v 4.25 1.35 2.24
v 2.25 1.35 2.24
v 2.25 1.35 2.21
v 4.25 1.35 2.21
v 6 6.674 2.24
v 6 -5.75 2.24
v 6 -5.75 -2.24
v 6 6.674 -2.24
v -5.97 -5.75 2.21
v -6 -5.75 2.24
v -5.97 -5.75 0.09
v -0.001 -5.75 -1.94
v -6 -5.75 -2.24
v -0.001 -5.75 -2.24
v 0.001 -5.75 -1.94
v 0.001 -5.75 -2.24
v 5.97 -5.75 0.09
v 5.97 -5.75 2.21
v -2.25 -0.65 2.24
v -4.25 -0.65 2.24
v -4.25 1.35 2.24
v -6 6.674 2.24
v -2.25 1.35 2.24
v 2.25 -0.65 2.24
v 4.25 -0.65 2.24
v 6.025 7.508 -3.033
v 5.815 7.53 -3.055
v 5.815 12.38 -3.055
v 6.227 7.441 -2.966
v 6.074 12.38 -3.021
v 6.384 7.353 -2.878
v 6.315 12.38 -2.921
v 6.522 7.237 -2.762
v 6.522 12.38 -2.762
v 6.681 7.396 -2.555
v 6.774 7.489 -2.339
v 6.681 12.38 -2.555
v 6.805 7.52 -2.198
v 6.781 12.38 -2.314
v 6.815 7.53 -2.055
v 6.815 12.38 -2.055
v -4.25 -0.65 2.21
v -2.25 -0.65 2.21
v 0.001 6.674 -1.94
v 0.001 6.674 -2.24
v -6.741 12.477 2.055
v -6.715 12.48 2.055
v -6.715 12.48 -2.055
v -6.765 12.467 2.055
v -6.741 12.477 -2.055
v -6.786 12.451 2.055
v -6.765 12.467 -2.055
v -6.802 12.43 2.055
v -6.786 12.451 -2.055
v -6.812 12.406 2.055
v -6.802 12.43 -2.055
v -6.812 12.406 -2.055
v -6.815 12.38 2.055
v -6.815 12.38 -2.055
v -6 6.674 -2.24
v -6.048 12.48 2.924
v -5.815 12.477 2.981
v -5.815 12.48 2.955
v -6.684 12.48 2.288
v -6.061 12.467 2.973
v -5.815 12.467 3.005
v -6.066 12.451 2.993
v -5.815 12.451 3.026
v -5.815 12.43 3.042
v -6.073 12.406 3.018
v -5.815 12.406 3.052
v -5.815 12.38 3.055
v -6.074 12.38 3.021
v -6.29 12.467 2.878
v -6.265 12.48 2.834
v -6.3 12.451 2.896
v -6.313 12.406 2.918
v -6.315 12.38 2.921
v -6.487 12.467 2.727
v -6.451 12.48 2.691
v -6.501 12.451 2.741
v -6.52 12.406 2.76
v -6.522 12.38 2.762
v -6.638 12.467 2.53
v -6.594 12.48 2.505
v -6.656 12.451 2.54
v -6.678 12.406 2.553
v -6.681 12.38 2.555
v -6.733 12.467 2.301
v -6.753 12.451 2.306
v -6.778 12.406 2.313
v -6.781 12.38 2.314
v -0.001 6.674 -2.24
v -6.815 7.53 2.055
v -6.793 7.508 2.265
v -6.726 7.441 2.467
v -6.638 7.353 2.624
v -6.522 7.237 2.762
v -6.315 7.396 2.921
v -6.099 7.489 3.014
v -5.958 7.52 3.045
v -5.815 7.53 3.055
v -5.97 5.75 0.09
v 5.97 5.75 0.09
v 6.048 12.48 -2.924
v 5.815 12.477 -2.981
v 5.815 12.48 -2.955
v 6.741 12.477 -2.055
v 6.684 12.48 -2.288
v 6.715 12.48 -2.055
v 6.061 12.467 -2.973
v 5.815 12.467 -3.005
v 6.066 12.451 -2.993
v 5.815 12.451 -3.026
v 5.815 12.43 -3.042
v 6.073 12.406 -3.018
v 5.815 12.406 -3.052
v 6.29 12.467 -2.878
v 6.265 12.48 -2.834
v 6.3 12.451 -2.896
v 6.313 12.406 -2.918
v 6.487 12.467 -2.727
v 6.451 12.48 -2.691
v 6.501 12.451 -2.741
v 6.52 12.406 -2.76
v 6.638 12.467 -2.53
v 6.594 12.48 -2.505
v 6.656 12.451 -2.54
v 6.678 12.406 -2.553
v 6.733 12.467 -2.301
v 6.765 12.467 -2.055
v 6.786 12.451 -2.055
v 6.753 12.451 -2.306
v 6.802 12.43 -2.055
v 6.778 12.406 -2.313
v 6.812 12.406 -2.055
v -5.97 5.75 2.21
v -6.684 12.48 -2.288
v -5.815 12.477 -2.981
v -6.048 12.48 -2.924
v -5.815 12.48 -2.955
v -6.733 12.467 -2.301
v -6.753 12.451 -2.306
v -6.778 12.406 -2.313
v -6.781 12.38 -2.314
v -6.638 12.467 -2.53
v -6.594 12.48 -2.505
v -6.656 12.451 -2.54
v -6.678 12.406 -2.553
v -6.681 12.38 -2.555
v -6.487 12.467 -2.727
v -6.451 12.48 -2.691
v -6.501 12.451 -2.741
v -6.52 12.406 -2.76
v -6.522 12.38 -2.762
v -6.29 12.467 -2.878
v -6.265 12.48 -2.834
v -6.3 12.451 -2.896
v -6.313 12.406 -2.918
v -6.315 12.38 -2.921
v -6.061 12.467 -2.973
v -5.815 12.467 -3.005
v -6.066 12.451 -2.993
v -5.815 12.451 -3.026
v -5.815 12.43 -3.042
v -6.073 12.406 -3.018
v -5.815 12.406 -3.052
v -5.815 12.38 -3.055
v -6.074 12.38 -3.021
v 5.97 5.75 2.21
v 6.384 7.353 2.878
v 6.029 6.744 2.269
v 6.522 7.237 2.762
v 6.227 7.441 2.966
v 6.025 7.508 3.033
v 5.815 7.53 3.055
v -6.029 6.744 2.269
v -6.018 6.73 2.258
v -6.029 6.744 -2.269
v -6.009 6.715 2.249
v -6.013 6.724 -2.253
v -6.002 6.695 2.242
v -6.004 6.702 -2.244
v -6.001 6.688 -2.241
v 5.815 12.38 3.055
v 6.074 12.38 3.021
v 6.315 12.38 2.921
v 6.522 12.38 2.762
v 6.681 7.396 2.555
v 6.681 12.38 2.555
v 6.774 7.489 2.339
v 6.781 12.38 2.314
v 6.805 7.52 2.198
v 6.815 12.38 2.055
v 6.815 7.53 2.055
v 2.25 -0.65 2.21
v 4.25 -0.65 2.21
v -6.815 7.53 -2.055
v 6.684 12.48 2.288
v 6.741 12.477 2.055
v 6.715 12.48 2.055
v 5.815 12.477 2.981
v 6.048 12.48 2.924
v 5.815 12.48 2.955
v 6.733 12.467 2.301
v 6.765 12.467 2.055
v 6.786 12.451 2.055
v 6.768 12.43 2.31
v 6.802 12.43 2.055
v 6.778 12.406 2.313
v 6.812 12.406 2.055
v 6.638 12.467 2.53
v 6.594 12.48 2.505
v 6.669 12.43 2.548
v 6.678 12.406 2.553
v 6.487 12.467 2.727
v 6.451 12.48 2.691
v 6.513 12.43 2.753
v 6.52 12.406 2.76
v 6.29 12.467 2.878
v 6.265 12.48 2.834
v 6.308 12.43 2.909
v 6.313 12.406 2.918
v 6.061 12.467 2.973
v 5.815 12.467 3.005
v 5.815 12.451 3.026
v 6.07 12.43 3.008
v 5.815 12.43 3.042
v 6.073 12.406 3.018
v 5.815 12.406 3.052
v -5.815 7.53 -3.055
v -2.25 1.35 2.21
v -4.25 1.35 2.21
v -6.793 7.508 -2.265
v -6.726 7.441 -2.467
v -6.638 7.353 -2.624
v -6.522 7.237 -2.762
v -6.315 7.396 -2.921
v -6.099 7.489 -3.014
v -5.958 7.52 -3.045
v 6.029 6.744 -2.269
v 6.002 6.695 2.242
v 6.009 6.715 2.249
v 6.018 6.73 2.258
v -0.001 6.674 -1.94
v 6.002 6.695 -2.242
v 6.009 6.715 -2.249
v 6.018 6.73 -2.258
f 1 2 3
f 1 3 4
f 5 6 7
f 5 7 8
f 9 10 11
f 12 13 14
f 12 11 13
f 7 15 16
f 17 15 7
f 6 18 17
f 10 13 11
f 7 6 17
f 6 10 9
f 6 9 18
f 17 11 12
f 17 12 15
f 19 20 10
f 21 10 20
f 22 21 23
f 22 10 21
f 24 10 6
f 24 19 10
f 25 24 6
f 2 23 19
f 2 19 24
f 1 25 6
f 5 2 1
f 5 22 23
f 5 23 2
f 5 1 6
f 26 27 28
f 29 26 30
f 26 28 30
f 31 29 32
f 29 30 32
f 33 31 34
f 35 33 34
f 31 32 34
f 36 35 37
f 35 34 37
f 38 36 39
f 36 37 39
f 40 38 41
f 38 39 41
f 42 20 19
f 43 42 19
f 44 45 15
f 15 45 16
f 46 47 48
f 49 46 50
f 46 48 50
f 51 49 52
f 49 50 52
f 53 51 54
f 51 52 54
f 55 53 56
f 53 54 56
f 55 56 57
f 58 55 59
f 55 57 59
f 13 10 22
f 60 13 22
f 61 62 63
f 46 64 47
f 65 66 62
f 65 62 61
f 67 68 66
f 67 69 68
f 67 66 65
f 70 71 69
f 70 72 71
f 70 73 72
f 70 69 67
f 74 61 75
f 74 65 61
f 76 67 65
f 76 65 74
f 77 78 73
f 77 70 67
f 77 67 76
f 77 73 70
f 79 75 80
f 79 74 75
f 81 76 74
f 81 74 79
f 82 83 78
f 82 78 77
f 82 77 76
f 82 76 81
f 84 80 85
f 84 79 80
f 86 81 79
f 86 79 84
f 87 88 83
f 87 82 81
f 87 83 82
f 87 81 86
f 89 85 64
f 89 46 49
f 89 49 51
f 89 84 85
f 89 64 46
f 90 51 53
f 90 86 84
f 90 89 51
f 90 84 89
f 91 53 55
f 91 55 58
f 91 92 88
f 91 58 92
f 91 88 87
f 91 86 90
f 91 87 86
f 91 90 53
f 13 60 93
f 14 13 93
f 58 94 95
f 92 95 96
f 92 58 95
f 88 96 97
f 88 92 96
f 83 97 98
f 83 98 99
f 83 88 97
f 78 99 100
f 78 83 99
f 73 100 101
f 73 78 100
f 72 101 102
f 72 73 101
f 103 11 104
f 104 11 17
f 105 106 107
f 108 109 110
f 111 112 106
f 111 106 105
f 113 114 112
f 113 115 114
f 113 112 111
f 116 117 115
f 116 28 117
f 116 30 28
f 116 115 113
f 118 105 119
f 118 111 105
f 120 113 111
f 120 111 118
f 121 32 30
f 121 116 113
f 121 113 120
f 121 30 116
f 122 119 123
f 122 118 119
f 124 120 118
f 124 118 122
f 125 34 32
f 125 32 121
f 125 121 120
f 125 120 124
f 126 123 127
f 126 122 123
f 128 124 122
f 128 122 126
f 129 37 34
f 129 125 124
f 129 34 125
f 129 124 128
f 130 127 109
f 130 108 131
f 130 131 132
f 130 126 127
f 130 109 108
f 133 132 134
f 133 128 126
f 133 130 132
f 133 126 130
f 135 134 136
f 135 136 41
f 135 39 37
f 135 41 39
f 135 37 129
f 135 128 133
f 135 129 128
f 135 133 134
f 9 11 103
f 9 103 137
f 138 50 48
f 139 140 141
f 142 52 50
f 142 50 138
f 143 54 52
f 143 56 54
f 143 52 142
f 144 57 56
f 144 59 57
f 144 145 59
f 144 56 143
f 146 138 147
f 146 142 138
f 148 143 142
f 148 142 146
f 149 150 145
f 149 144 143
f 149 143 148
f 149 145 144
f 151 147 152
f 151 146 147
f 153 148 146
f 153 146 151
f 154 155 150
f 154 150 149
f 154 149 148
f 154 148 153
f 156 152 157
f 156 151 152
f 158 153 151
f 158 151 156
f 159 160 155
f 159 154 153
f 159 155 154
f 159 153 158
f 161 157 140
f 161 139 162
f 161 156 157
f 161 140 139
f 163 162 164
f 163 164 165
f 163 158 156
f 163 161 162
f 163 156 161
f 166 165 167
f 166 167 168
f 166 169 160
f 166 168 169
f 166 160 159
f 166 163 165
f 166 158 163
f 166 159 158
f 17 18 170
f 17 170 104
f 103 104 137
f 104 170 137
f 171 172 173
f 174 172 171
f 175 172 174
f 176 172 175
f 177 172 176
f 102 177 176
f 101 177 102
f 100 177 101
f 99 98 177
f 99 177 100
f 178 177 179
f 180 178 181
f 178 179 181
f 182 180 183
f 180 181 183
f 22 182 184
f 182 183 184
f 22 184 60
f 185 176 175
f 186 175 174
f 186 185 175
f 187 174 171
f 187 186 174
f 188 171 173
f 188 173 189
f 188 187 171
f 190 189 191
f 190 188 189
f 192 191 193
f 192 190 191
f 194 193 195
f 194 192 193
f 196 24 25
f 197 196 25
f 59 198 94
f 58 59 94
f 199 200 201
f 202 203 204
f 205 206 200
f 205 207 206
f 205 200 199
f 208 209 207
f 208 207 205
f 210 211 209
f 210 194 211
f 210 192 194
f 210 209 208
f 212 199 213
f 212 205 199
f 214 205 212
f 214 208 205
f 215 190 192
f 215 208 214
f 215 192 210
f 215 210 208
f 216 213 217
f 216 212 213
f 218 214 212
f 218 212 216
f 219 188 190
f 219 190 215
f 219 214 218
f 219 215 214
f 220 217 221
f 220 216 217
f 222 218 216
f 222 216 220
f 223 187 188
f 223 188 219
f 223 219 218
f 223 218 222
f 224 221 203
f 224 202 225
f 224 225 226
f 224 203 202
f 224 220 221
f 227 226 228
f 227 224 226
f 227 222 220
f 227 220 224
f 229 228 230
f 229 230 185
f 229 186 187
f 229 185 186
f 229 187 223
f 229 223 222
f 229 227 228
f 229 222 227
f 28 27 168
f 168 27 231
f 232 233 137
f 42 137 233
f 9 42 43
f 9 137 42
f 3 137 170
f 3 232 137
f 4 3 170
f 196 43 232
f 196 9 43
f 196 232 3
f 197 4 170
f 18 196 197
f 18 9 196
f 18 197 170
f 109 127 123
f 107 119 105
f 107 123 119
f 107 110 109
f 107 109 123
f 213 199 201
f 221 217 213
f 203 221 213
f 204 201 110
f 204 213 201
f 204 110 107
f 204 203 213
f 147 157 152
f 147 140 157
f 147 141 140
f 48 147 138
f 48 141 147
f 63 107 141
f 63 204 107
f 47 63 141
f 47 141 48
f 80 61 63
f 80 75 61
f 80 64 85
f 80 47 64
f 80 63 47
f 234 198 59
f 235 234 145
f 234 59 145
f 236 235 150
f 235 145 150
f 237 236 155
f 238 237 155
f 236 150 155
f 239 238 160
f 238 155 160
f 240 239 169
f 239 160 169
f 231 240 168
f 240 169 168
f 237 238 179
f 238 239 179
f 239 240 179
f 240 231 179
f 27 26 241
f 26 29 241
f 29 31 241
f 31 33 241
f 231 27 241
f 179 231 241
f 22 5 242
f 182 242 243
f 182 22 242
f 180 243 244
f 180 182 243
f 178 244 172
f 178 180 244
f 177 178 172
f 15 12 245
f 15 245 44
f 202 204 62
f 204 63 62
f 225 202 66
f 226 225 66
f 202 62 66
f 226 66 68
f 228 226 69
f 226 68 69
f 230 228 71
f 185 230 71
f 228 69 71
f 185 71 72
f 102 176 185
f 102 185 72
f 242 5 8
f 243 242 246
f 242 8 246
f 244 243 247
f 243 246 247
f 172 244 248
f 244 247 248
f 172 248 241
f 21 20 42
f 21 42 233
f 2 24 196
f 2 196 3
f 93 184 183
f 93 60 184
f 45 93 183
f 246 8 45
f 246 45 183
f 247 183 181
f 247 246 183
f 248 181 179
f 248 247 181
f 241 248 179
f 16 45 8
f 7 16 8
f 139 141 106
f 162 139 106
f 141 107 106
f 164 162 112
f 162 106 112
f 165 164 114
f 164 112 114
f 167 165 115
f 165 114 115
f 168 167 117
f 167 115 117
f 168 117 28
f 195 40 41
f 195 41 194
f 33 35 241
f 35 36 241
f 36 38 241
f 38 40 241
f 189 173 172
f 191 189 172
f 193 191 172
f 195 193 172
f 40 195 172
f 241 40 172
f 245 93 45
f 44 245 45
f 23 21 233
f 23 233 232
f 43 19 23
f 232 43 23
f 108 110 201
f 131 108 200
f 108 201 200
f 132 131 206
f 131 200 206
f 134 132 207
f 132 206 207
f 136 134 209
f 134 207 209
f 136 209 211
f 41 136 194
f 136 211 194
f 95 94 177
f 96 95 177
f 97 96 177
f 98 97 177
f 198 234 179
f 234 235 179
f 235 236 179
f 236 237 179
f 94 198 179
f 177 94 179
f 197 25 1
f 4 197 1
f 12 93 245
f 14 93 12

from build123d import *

# Parameters (mm, degrees)
F0_W         = 12
F0_H         = 4.48
F1_DEPTH     = 5.75
F0_W_2       = 11.94
F0_H_2       = 2.3
F2_DEPTH     = 5.75
F3_W         = 13.63
F3_H         = 6.11
F3_W_2       = 12
F3_H_2       = 4.48
F3_W_3       = 11.94
F3_H_3       = 2.12
F4_DEPTH     = 6.73
F5_T4_DEPTH  = 22.7851914372
F5_T9_DEPTH  = 22.7851914372
F5_T14_DEPTH = 22.7851914372
F5_T19_DEPTH = 15.2651914372
F5_T24_DEPTH = 15.2651914372
F5_T29_DEPTH = 15.2651914372
F5_T34_DEPTH = 22.7851914372
F5_T39_DEPTH = 22.7851914372
F5_T44_DEPTH = 22.7851914372
F5_T49_DEPTH = 15.2651914372
F5_T54_DEPTH = 15.2651914372
F5_T59_DEPTH = 15.2651914372
F6_R         = 0.1
F7_R         = 1
F8_R         = 0.1
F9_W         = 2
F9_H         = 2
F10_DEPTH    = 2.15
F11_W        = 0.001
F11_H        = 12.4235786438
F12_DEPTH    = 0.3


# Not quite as in the source:
# - a fillet or chamfer that OpenCascade refuses, or shapes differently, is made with other operations: its cross-section is extruded or revolved along the edge and cut away or added


with BuildPart() as f1:
    # F0 (on Front) → F1 (new body, symmetric)
    with BuildSketch(Plane.XZ):
        Rectangle(F0_W, F0_H)
        Polygon((5.97, -2.21), (-5.97, -2.21), (-5.97, 0.09), (-5.97, 2.21), (5.97, 2.21), (5.97, 0.09), align=None, mode=Mode.SUBTRACT)
    extrude(amount=F1_DEPTH, both=True)

    # F0 (on Front) → F2 (join, symmetric)
    with BuildSketch(Plane.XZ):
        with Locations((0, -1.06)):
            Rectangle(F0_W_2, F0_H_2)
    extrude(amount=F2_DEPTH, both=True)

    # F3 (on face) → F4 (join)
    with BuildSketch(Plane(origin=(0, 5.75, 0), x_dir=(-1, 0, 0), z_dir=(0, 1, 0))):
        Rectangle(F3_W, F3_H)
        Rectangle(F3_W_2, F3_H_2, mode=Mode.SUBTRACT)
        Rectangle(F3_W_2, F3_H_2)
        with Locations((0, 1.15)):
            Rectangle(F3_W_3, F3_H_3, mode=Mode.SUBTRACT)
        with Locations((0, 1.15)):
            Rectangle(F3_W_3, F3_H_3)
    extrude(amount=F4_DEPTH)

    # F5: chamfer of 1.78 on 4 edges, made by hand


with BuildPart() as f5_tool2:
    # F5_s3 → F5_t4 (new body)
    with BuildSketch(Plane.YZ.offset(-11.3925957186)):
        Polygon((5.75, 1.275), (7.53, 3.055), (5.75, 3.055), align=None)
    extrude(amount=F5_T4_DEPTH)

    split(bisect_by=Plane.YZ.offset(-6), keep=Keep.BOTTOM)


with BuildPart() as f1_1:
    add(f1.part)

    # F5_t1: cut F5_tool2
    add(f5_tool2.part, mode=Mode.SUBTRACT)


with BuildPart() as f5_tool7:
    # F5_s8 → F5_t9 (new body)
    with BuildSketch(Plane.YZ.offset(-11.3925957186)):
        Polygon((5.75, 1.275), (7.53, 3.055), (5.75, 3.055), align=None)
    extrude(amount=F5_T9_DEPTH)

    split(bisect_by=Plane.XY.offset(2.24), keep=Keep.TOP)


with BuildPart() as f1_2:
    add(f1_1.part)

    # F5_t6: cut F5_tool7
    add(f5_tool7.part, mode=Mode.SUBTRACT)


with BuildPart() as f5_tool12:
    # F5_s13 → F5_t14 (new body)
    with BuildSketch(Plane.YZ.offset(-11.3925957186)):
        Polygon((5.75, 1.275), (7.53, 3.055), (5.75, 3.055), align=None)
    extrude(amount=F5_T14_DEPTH)

    split(bisect_by=Plane.YZ.offset(6), keep=Keep.TOP)


with BuildPart() as f1_3:
    add(f1_2.part)

    # F5_t11: cut F5_tool12
    add(f5_tool12.part, mode=Mode.SUBTRACT)


with BuildPart() as f5_tool17:
    # F5_s18 → F5_t19 (new body)
    with BuildSketch(Plane.XY.offset(7.6325957186)):
        Polygon((6.815, 7.53), (5.035, 5.75), (6.815, 5.75), align=None)
    extrude(amount=-F5_T19_DEPTH)

    split(bisect_by=Plane.YZ.offset(6), keep=Keep.TOP)


with BuildPart() as f1_4:
    add(f1_3.part)

    # F5_t16: cut F5_tool17
    add(f5_tool17.part, mode=Mode.SUBTRACT)


with BuildPart() as f5_tool22:
    # F5_s23 → F5_t24 (new body)
    with BuildSketch(Plane.XY.offset(7.6325957186)):
        Polygon((6.815, 7.53), (5.035, 5.75), (6.815, 5.75), align=None)
    extrude(amount=-F5_T24_DEPTH)

    split(bisect_by=Plane.XY.offset(2.24), keep=Keep.TOP)


with BuildPart() as f1_5:
    add(f1_4.part)

    # F5_t21: cut F5_tool22
    add(f5_tool22.part, mode=Mode.SUBTRACT)


with BuildPart() as f5_tool27:
    # F5_s28 → F5_t29 (new body)
    with BuildSketch(Plane.XY.offset(7.6325957186)):
        Polygon((6.815, 7.53), (5.035, 5.75), (6.815, 5.75), align=None)
    extrude(amount=-F5_T29_DEPTH)

    split(bisect_by=Plane.XY.offset(-2.24), keep=Keep.BOTTOM)


with BuildPart() as f1_6:
    add(f1_5.part)

    # F5_t26: cut F5_tool27
    add(f5_tool27.part, mode=Mode.SUBTRACT)


with BuildPart() as f5_tool32:
    # F5_s33 → F5_t34 (new body)
    with BuildSketch(Plane.YZ.offset(11.3925957186)):
        Polygon((7.53, -3.055), (5.75, -1.275), (5.75, -3.055), align=None)
    extrude(amount=-F5_T34_DEPTH)

    split(bisect_by=Plane.XY.offset(-2.24), keep=Keep.BOTTOM)


with BuildPart() as f1_7:
    add(f1_6.part)

    # F5_t31: cut F5_tool32
    add(f5_tool32.part, mode=Mode.SUBTRACT)


with BuildPart() as f5_tool37:
    # F5_s38 → F5_t39 (new body)
    with BuildSketch(Plane.YZ.offset(11.3925957186)):
        Polygon((7.53, -3.055), (5.75, -1.275), (5.75, -3.055), align=None)
    extrude(amount=-F5_T39_DEPTH)

    split(bisect_by=Plane.YZ.offset(6), keep=Keep.TOP)


with BuildPart() as f1_8:
    add(f1_7.part)

    # F5_t36: cut F5_tool37
    add(f5_tool37.part, mode=Mode.SUBTRACT)


with BuildPart() as f5_tool42:
    # F5_s43 → F5_t44 (new body)
    with BuildSketch(Plane.YZ.offset(11.3925957186)):
        Polygon((7.53, -3.055), (5.75, -1.275), (5.75, -3.055), align=None)
    extrude(amount=-F5_T44_DEPTH)

    split(bisect_by=Plane.YZ.offset(-6), keep=Keep.BOTTOM)


with BuildPart() as f1_9:
    add(f1_8.part)

    # F5_t41: cut F5_tool42
    add(f5_tool42.part, mode=Mode.SUBTRACT)


with BuildPart() as f5_tool47:
    # F5_s48 → F5_t49 (new body)
    with BuildSketch(Plane.XY.offset(-7.6325957186)):
        Polygon((-6.815, 7.53), (-5.035, 5.75), (-6.815, 5.75), align=None)
    extrude(amount=F5_T49_DEPTH)

    split(bisect_by=Plane.YZ.offset(-6), keep=Keep.BOTTOM)


with BuildPart() as f1_10:
    add(f1_9.part)

    # F5_t46: cut F5_tool47
    add(f5_tool47.part, mode=Mode.SUBTRACT)


with BuildPart() as f5_tool52:
    # F5_s53 → F5_t54 (new body)
    with BuildSketch(Plane.XY.offset(-7.6325957186)):
        Polygon((-6.815, 7.53), (-5.035, 5.75), (-6.815, 5.75), align=None)
    extrude(amount=F5_T54_DEPTH)

    split(bisect_by=Plane.XY.offset(-2.24), keep=Keep.BOTTOM)


with BuildPart() as f1_11:
    add(f1_10.part)

    # F5_t51: cut F5_tool52
    add(f5_tool52.part, mode=Mode.SUBTRACT)


with BuildPart() as f5_tool57:
    # F5_s58 → F5_t59 (new body)
    with BuildSketch(Plane.XY.offset(-7.6325957186)):
        Polygon((-6.815, 7.53), (-5.035, 5.75), (-6.815, 5.75), align=None)
    extrude(amount=F5_T59_DEPTH)

    split(bisect_by=Plane.XY.offset(2.24), keep=Keep.TOP)


with BuildPart() as f1_12:
    add(f1_11.part)

    # F5_t56: cut F5_tool57
    add(f5_tool57.part, mode=Mode.SUBTRACT)

    # F6
    f6_edges = [f1_12.edges().sort_by_distance(p)[0] for p in [
        (0, 6.715, 2.24),
        (6, 6.715, 0),
        (-6, 6.715, 0),
        (0, 6.715, -2.24),
    ]]
    fillet(f6_edges, radius=F6_R)

    # F7
    f7_edges = [f1_12.edges().sort_by_distance(p)[0] for p in [
        (-6.815, 10.005, -3.055),
        (-6.815, 10.005, 3.055),
        (6.815, 10.005, -3.055),
        (6.815, 10.005, 3.055),
    ]]
    fillet(f7_edges, radius=F7_R)

    # F8
    f8_edges = [f1_12.edges().sort_by_distance(p)[0] for p in [
        (0, 12.48, 3.055),
        (-6.522107, 12.48, 2.762107),
        (6.522107, 12.48, 2.762107),
        (-6.522107, 12.48, -2.762107),
        (-6.815, 12.48, 0),
        (0, 12.48, -3.055),
        (6.522107, 12.48, -2.762107),
        (6.815, 12.48, 0),
    ]]
    fillet(f8_edges, radius=F8_R)

    # F9 (on face) → F10 (cut, through all)
    with BuildSketch(Plane.XY.offset(2.24)):
        with Locations((-3.25, 0.35)):
            Rectangle(F9_W, F9_H)
        with Locations((3.25, 0.35)):
            Rectangle(F9_W, F9_H)
    extrude(amount=-F10_DEPTH, mode=Mode.SUBTRACT)

    # F11 (on face) → F12 (cut)
    with BuildSketch(Plane(origin=(0, 0, -2.24), x_dir=(1, 0, 0), z_dir=(0, 0, -1))):
        with Locations((0.0005, -0.4617893219)):
            Rectangle(F11_W, F11_H)
        with Locations((-0.0005, -0.4617893219)):
            Rectangle(F11_W, F11_H)
    extrude(amount=-F12_DEPTH, mode=Mode.SUBTRACT)


solid = f1_12.part
